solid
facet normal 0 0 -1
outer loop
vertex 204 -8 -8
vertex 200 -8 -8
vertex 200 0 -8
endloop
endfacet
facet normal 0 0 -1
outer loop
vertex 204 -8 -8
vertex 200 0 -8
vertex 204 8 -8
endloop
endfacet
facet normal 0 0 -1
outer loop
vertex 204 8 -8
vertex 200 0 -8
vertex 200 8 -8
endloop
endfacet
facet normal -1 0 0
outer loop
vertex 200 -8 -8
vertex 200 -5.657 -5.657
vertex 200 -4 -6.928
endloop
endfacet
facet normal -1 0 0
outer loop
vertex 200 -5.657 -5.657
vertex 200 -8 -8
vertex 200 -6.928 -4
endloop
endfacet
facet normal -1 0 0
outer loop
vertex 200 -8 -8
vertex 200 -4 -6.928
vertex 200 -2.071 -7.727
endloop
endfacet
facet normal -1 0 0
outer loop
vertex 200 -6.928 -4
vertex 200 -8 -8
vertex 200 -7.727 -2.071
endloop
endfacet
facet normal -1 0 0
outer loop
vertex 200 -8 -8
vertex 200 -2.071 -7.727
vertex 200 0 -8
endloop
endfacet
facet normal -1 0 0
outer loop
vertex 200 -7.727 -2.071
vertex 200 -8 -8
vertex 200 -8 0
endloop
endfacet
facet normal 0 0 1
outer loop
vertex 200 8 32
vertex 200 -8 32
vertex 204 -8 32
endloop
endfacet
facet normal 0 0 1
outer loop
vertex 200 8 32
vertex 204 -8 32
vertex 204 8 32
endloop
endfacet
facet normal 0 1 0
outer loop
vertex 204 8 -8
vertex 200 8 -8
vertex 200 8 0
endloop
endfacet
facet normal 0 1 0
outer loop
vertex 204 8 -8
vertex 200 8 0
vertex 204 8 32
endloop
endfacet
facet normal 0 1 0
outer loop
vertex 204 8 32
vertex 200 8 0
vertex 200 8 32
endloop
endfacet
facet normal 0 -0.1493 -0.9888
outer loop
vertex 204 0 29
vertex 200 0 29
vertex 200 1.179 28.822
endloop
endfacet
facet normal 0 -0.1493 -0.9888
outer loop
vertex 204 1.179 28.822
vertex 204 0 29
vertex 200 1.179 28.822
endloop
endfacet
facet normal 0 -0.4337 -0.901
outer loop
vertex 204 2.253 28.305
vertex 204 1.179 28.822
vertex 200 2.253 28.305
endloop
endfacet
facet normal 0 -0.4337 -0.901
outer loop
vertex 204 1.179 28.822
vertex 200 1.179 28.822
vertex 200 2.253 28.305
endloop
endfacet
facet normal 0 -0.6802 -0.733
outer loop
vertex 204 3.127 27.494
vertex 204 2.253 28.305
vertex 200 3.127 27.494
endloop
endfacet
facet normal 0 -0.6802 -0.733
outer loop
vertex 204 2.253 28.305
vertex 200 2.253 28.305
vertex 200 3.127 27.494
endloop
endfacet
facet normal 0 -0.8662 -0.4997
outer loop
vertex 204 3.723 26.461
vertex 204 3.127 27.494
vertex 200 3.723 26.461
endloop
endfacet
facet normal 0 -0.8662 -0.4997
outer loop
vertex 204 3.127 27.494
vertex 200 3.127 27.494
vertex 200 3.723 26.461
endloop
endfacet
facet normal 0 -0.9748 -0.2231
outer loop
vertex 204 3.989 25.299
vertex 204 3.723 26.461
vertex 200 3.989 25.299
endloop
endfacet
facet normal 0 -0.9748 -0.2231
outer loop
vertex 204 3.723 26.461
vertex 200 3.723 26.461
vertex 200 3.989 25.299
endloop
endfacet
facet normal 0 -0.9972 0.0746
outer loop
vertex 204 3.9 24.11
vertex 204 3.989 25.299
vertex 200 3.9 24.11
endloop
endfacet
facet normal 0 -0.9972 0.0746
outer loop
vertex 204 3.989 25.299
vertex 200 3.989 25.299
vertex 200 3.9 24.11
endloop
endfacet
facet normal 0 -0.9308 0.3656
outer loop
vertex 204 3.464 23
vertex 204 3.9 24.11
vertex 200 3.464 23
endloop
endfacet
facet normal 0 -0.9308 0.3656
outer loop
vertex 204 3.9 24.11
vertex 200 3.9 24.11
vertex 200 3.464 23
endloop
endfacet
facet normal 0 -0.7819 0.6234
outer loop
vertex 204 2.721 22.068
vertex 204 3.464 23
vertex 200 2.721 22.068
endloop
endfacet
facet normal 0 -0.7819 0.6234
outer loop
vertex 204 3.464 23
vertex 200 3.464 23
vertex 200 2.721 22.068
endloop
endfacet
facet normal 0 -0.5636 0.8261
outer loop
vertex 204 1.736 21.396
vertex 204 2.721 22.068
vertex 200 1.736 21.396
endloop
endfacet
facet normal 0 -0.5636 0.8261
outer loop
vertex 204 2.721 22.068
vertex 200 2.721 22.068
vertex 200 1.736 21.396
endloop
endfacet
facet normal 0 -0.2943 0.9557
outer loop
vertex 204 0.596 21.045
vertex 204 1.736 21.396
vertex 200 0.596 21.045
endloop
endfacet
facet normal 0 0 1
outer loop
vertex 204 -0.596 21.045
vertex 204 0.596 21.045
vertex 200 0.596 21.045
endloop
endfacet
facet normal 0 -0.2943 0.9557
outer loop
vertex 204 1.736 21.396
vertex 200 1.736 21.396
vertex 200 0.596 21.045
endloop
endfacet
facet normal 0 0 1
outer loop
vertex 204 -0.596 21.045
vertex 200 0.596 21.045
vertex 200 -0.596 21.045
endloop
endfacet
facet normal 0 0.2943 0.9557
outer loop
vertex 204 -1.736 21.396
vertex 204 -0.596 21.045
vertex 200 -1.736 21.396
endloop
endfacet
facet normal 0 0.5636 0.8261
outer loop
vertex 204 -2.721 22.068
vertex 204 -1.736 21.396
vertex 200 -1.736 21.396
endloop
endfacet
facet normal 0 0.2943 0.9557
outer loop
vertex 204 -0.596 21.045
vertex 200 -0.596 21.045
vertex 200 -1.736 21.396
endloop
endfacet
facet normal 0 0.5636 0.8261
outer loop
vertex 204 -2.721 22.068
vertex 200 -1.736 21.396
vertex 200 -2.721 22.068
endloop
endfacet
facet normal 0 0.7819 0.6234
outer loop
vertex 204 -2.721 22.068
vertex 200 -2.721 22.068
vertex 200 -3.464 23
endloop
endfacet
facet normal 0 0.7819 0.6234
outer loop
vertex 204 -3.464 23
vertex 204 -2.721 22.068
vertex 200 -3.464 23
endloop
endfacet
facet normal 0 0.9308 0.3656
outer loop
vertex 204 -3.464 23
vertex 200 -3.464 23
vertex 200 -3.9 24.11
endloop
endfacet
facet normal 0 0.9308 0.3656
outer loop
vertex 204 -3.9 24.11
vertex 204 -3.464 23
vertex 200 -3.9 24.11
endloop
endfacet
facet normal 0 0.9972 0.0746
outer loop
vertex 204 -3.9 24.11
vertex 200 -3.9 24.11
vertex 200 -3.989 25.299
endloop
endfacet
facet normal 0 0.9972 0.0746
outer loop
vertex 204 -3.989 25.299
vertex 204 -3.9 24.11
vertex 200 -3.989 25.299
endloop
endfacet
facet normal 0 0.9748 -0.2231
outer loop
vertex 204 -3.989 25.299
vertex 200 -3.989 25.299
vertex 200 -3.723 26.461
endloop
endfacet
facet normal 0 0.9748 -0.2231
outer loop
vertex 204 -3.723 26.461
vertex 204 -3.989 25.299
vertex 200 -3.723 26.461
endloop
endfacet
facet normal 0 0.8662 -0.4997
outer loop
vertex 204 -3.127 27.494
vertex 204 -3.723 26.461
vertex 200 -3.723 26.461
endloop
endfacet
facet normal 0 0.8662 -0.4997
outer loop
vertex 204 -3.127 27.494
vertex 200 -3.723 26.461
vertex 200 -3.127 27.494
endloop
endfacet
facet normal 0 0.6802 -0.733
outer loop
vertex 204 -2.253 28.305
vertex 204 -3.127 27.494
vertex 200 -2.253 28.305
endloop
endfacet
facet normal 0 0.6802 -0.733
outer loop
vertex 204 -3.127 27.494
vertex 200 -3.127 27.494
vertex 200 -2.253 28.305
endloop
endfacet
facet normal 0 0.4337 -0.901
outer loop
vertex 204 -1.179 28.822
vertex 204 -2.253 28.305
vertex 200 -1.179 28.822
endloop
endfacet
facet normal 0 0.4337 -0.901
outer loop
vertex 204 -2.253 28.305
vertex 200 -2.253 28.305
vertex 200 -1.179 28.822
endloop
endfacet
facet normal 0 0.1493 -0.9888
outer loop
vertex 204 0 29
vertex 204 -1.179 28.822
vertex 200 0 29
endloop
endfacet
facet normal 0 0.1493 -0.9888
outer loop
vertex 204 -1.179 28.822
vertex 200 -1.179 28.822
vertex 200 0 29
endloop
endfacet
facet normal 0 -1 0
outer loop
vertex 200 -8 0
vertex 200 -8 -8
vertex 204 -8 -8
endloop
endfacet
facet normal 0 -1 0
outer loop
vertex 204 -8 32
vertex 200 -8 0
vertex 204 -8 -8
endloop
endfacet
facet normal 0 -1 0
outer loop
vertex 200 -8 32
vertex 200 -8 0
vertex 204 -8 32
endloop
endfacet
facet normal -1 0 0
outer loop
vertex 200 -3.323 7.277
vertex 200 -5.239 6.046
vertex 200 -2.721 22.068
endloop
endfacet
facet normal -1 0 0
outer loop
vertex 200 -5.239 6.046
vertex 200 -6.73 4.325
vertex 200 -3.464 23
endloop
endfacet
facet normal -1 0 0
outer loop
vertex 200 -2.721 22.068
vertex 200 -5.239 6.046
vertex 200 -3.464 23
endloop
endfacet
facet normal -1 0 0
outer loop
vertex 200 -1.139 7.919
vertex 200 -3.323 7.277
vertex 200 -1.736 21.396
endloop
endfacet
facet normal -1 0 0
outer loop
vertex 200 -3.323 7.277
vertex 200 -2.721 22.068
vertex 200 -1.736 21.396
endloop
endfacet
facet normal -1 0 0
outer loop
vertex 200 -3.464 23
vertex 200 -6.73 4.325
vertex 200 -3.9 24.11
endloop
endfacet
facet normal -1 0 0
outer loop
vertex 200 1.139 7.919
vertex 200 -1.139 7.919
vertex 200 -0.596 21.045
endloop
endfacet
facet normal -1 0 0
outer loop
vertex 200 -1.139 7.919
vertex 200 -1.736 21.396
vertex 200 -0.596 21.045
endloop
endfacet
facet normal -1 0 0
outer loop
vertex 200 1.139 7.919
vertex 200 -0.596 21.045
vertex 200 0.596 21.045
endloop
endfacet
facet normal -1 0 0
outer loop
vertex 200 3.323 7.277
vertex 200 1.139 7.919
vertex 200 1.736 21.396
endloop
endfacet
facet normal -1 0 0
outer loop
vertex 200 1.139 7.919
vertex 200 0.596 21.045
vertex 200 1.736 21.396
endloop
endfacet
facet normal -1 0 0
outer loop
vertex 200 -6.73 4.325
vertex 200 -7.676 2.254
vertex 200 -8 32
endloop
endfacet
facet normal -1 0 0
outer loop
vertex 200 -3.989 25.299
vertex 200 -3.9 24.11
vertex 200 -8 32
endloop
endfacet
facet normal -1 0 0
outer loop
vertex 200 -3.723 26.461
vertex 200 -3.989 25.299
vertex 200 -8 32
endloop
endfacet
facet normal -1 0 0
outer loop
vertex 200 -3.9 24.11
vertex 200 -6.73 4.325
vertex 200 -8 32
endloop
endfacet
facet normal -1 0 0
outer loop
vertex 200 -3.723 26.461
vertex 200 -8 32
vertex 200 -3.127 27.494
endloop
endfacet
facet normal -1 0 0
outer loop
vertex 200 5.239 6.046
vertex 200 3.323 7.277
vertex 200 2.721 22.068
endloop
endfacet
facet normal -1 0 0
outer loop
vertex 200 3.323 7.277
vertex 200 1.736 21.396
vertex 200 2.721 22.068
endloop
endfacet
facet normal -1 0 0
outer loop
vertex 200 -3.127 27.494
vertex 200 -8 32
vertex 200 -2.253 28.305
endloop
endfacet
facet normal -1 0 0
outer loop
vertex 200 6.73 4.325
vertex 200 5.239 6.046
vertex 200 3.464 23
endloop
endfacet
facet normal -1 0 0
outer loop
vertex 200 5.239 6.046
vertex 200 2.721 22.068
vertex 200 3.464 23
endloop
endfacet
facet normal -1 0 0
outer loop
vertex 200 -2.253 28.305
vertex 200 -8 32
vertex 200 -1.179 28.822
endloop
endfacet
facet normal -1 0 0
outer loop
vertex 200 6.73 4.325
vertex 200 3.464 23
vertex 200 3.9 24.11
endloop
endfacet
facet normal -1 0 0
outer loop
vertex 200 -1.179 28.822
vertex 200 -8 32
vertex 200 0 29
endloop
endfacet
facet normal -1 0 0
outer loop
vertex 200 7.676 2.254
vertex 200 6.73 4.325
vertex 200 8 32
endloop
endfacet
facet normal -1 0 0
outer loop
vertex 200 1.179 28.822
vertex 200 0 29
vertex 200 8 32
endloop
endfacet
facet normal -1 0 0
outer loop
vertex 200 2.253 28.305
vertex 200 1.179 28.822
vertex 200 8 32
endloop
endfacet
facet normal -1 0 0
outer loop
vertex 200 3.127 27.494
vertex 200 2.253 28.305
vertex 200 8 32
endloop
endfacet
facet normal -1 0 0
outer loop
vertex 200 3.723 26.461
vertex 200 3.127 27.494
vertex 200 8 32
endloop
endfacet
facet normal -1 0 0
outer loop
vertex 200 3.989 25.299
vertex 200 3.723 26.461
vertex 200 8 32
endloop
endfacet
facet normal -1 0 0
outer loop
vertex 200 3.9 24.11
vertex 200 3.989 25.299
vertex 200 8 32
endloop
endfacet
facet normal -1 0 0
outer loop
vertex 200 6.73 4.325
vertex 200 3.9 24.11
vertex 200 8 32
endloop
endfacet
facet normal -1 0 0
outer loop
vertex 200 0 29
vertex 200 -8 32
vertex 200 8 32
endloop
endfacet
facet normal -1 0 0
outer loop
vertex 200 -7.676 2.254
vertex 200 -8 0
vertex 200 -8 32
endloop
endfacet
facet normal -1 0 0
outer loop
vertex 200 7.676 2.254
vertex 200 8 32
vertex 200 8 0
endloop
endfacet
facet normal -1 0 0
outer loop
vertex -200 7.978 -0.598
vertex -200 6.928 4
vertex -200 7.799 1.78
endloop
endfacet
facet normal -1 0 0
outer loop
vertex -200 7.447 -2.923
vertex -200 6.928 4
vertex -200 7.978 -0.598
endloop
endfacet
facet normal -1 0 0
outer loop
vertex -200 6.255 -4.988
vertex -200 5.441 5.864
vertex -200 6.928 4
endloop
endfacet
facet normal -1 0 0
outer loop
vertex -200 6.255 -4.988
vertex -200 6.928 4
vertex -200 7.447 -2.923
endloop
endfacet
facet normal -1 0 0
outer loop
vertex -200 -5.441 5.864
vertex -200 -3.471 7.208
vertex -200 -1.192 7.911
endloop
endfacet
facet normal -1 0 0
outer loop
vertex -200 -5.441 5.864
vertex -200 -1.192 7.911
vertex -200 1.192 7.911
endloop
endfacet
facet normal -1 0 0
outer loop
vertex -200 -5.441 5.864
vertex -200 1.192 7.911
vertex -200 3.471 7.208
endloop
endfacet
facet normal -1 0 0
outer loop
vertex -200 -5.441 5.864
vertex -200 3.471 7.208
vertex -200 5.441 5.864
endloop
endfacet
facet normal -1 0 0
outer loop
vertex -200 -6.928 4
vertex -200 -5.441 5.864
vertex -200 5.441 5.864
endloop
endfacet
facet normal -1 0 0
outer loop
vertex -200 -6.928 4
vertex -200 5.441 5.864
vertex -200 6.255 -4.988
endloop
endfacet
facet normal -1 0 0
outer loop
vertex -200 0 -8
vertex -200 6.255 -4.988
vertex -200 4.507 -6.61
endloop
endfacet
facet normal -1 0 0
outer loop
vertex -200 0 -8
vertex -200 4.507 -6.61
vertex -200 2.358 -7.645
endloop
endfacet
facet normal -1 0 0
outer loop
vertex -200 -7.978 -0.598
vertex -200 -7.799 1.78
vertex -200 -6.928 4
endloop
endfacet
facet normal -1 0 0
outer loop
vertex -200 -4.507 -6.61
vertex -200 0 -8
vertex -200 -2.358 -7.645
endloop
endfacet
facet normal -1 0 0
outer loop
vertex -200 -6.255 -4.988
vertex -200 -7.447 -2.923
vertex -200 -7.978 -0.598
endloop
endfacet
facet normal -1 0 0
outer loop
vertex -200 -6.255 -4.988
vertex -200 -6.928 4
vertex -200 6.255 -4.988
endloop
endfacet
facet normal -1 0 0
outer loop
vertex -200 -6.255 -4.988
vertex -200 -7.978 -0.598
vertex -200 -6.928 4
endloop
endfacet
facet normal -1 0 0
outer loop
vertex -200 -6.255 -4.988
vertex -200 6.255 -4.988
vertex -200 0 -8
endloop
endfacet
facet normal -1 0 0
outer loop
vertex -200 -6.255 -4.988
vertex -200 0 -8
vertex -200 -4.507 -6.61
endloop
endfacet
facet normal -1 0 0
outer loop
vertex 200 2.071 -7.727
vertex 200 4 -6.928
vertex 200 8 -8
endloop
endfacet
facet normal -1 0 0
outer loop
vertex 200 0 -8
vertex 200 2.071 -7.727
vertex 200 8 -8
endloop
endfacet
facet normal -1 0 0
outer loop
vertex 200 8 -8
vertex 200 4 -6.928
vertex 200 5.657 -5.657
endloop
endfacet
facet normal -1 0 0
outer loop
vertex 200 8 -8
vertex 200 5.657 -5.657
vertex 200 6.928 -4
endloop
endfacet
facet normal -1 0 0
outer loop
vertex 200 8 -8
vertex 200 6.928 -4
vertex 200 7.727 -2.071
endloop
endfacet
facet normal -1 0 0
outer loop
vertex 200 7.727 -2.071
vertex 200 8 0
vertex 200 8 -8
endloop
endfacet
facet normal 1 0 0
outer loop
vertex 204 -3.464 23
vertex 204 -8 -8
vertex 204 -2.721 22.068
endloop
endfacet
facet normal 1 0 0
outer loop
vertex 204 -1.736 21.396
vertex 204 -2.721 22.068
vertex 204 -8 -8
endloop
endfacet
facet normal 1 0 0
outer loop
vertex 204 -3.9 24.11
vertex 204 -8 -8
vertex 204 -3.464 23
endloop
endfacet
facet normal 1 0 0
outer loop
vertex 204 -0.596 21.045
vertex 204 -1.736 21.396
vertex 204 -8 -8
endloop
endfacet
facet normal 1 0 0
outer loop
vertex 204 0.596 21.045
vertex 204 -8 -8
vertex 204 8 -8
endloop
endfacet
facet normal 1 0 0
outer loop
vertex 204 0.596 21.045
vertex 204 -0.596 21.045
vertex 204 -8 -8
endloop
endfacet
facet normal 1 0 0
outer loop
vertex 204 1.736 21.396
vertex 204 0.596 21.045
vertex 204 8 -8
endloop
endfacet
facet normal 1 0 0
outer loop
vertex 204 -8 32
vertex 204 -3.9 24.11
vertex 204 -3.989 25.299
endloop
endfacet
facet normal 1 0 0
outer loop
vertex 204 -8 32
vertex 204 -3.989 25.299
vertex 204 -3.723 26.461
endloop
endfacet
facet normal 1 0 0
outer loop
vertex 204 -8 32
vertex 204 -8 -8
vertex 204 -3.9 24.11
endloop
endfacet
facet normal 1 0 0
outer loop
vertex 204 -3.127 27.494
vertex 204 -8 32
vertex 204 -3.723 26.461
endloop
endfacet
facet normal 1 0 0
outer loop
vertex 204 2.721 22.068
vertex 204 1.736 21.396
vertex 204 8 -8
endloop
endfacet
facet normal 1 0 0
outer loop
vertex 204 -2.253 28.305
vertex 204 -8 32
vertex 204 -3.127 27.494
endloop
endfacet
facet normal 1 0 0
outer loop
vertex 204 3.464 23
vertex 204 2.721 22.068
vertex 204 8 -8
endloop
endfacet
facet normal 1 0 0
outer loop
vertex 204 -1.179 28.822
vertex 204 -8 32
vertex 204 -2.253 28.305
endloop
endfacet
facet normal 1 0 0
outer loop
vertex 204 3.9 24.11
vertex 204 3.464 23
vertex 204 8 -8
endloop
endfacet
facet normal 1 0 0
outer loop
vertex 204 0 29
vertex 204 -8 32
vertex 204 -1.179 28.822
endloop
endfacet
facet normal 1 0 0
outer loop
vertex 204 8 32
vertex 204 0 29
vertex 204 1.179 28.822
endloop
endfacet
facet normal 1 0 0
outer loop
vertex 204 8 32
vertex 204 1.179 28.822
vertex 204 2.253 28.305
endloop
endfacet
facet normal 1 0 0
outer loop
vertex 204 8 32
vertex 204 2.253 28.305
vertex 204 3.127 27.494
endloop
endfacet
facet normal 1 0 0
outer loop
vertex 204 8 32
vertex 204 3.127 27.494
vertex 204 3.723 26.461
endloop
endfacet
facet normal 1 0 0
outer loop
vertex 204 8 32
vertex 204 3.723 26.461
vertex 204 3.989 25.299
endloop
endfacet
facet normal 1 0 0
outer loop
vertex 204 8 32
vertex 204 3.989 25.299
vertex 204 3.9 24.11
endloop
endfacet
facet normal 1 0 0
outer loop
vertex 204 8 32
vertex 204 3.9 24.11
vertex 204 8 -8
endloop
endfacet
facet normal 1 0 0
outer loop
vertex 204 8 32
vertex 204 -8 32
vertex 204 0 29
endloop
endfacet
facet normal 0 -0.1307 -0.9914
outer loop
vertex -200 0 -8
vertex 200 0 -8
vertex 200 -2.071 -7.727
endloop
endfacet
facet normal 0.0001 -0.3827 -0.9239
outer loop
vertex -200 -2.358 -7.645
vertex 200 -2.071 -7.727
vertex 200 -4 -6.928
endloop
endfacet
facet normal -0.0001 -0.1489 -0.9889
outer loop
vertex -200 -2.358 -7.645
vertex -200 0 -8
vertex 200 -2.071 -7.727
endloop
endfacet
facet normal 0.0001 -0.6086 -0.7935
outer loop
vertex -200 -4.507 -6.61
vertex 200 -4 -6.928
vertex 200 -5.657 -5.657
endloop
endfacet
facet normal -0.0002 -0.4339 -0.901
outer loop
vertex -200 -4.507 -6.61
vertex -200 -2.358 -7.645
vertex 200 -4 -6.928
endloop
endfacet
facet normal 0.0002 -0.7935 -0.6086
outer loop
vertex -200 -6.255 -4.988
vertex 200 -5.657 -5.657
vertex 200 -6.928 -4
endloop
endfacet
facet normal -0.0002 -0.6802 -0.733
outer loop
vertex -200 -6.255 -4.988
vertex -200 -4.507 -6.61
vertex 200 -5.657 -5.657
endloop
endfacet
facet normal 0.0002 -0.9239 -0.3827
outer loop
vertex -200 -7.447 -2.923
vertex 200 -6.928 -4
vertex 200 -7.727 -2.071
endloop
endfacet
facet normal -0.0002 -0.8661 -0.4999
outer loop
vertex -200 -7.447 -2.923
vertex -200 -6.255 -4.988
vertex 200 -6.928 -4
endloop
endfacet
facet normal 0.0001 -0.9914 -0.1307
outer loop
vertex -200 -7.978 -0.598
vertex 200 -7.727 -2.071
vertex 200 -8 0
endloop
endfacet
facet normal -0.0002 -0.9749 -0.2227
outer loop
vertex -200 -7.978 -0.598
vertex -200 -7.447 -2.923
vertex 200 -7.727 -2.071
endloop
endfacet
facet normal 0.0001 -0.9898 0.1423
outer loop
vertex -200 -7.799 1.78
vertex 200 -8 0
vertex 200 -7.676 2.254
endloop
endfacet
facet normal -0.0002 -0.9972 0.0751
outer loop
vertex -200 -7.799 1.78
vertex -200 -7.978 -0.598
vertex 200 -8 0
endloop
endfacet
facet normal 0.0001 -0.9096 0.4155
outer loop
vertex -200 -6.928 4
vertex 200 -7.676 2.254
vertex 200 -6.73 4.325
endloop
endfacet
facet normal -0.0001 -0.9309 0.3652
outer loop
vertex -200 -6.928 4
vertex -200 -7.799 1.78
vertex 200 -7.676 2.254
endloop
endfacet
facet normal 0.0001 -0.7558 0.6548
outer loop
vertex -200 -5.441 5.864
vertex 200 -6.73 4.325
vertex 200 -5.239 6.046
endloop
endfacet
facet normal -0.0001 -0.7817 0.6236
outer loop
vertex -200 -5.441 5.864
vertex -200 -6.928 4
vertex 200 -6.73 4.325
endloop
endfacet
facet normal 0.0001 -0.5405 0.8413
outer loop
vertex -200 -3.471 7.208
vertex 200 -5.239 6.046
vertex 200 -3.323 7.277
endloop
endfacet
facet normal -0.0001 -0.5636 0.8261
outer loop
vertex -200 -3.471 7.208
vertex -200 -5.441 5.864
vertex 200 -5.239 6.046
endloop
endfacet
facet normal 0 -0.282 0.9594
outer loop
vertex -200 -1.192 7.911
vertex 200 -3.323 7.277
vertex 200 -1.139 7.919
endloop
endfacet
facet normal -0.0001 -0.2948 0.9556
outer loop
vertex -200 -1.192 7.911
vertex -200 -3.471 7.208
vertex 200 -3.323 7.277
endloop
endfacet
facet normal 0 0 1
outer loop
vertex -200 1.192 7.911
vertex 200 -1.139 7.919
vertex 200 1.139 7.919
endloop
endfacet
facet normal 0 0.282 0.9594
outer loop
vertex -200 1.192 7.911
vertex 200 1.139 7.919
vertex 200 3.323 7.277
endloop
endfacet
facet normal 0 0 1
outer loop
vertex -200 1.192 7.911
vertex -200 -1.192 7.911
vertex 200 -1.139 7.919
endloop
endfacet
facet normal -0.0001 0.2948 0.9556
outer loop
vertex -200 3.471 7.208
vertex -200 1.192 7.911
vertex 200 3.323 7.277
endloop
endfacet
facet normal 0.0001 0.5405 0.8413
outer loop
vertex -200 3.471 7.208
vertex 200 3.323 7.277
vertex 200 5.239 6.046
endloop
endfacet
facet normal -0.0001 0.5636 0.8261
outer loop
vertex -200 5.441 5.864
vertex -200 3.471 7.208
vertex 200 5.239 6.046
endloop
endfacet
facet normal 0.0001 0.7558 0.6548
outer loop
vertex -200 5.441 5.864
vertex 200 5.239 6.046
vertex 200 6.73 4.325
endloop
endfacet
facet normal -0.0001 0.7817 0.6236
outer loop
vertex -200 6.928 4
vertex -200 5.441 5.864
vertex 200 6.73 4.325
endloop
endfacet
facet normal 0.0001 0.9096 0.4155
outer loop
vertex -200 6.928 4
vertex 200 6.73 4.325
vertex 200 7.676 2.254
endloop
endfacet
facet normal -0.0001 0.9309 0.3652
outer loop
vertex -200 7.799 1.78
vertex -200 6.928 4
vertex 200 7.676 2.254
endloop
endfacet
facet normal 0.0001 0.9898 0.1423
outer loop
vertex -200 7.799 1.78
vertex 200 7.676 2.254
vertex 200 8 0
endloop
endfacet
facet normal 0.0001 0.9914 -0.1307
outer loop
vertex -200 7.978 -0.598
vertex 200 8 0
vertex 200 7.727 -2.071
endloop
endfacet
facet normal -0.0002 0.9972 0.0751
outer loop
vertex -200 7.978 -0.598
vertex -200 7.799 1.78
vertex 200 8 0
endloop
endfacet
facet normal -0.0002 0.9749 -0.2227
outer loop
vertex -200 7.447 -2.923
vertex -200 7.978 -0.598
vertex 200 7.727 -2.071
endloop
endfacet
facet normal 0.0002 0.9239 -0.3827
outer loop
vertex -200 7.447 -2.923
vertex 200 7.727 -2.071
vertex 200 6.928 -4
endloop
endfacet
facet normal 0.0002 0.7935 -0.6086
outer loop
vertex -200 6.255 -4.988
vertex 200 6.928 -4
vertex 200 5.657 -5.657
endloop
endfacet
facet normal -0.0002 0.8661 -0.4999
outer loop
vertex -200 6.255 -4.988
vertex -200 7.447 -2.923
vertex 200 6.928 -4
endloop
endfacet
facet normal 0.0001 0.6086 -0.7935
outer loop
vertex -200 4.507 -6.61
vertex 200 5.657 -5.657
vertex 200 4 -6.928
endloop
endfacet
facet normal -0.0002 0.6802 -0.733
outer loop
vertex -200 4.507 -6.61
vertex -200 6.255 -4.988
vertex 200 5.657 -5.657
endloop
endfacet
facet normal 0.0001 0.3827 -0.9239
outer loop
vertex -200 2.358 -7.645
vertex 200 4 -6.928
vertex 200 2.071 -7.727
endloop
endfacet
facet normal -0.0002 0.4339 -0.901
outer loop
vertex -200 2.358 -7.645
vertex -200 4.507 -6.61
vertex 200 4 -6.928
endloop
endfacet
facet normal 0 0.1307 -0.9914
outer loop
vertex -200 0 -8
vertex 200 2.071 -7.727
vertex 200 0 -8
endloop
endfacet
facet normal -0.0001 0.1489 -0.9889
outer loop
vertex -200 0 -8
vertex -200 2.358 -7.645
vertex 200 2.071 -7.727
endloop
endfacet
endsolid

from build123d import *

# Parameters (mm, degrees)
SKETCH2_W           = 400
SKETCH2_H           = 8
SKETCH3_W           = 16
SKETCH3_H           = 40
BOSS_EXTRUDE1_DEPTH = 4
SKETCH5_R           = 4
CUT_EXTRUDE1_DEPTH  = 4


with BuildPart() as part:
    # Sketch2 → Revolve1 (revolve)
    with BuildSketch(Plane(origin=(0, 0, 0), x_dir=(-1, 0, 0), z_dir=(0, 1, 0))):
        with Locations((0, -4)):
            Rectangle(SKETCH2_W, SKETCH2_H)
    revolve(axis=Axis((200, 0, 0), (-1, 0, 0)))

    # Sketch3 → Boss-Extrude1 (add)
    with BuildSketch(Plane.YZ.offset(200)):
        with Locations((0, 12)):
            Rectangle(SKETCH3_W, SKETCH3_H)
    extrude(amount=BOSS_EXTRUDE1_DEPTH)

    # Sketch5 → Cut-Extrude1 (cut)
    with BuildSketch(Plane(origin=(200, 0, 0), x_dir=(0, -1, 0), z_dir=(-1, 0, 0))):
        with Locations(Location((0, 25, 0), (0, 0, 90))):
            Circle(SKETCH5_R)
    extrude(amount=-CUT_EXTRUDE1_DEPTH, mode=Mode.SUBTRACT)


solid = part.part
